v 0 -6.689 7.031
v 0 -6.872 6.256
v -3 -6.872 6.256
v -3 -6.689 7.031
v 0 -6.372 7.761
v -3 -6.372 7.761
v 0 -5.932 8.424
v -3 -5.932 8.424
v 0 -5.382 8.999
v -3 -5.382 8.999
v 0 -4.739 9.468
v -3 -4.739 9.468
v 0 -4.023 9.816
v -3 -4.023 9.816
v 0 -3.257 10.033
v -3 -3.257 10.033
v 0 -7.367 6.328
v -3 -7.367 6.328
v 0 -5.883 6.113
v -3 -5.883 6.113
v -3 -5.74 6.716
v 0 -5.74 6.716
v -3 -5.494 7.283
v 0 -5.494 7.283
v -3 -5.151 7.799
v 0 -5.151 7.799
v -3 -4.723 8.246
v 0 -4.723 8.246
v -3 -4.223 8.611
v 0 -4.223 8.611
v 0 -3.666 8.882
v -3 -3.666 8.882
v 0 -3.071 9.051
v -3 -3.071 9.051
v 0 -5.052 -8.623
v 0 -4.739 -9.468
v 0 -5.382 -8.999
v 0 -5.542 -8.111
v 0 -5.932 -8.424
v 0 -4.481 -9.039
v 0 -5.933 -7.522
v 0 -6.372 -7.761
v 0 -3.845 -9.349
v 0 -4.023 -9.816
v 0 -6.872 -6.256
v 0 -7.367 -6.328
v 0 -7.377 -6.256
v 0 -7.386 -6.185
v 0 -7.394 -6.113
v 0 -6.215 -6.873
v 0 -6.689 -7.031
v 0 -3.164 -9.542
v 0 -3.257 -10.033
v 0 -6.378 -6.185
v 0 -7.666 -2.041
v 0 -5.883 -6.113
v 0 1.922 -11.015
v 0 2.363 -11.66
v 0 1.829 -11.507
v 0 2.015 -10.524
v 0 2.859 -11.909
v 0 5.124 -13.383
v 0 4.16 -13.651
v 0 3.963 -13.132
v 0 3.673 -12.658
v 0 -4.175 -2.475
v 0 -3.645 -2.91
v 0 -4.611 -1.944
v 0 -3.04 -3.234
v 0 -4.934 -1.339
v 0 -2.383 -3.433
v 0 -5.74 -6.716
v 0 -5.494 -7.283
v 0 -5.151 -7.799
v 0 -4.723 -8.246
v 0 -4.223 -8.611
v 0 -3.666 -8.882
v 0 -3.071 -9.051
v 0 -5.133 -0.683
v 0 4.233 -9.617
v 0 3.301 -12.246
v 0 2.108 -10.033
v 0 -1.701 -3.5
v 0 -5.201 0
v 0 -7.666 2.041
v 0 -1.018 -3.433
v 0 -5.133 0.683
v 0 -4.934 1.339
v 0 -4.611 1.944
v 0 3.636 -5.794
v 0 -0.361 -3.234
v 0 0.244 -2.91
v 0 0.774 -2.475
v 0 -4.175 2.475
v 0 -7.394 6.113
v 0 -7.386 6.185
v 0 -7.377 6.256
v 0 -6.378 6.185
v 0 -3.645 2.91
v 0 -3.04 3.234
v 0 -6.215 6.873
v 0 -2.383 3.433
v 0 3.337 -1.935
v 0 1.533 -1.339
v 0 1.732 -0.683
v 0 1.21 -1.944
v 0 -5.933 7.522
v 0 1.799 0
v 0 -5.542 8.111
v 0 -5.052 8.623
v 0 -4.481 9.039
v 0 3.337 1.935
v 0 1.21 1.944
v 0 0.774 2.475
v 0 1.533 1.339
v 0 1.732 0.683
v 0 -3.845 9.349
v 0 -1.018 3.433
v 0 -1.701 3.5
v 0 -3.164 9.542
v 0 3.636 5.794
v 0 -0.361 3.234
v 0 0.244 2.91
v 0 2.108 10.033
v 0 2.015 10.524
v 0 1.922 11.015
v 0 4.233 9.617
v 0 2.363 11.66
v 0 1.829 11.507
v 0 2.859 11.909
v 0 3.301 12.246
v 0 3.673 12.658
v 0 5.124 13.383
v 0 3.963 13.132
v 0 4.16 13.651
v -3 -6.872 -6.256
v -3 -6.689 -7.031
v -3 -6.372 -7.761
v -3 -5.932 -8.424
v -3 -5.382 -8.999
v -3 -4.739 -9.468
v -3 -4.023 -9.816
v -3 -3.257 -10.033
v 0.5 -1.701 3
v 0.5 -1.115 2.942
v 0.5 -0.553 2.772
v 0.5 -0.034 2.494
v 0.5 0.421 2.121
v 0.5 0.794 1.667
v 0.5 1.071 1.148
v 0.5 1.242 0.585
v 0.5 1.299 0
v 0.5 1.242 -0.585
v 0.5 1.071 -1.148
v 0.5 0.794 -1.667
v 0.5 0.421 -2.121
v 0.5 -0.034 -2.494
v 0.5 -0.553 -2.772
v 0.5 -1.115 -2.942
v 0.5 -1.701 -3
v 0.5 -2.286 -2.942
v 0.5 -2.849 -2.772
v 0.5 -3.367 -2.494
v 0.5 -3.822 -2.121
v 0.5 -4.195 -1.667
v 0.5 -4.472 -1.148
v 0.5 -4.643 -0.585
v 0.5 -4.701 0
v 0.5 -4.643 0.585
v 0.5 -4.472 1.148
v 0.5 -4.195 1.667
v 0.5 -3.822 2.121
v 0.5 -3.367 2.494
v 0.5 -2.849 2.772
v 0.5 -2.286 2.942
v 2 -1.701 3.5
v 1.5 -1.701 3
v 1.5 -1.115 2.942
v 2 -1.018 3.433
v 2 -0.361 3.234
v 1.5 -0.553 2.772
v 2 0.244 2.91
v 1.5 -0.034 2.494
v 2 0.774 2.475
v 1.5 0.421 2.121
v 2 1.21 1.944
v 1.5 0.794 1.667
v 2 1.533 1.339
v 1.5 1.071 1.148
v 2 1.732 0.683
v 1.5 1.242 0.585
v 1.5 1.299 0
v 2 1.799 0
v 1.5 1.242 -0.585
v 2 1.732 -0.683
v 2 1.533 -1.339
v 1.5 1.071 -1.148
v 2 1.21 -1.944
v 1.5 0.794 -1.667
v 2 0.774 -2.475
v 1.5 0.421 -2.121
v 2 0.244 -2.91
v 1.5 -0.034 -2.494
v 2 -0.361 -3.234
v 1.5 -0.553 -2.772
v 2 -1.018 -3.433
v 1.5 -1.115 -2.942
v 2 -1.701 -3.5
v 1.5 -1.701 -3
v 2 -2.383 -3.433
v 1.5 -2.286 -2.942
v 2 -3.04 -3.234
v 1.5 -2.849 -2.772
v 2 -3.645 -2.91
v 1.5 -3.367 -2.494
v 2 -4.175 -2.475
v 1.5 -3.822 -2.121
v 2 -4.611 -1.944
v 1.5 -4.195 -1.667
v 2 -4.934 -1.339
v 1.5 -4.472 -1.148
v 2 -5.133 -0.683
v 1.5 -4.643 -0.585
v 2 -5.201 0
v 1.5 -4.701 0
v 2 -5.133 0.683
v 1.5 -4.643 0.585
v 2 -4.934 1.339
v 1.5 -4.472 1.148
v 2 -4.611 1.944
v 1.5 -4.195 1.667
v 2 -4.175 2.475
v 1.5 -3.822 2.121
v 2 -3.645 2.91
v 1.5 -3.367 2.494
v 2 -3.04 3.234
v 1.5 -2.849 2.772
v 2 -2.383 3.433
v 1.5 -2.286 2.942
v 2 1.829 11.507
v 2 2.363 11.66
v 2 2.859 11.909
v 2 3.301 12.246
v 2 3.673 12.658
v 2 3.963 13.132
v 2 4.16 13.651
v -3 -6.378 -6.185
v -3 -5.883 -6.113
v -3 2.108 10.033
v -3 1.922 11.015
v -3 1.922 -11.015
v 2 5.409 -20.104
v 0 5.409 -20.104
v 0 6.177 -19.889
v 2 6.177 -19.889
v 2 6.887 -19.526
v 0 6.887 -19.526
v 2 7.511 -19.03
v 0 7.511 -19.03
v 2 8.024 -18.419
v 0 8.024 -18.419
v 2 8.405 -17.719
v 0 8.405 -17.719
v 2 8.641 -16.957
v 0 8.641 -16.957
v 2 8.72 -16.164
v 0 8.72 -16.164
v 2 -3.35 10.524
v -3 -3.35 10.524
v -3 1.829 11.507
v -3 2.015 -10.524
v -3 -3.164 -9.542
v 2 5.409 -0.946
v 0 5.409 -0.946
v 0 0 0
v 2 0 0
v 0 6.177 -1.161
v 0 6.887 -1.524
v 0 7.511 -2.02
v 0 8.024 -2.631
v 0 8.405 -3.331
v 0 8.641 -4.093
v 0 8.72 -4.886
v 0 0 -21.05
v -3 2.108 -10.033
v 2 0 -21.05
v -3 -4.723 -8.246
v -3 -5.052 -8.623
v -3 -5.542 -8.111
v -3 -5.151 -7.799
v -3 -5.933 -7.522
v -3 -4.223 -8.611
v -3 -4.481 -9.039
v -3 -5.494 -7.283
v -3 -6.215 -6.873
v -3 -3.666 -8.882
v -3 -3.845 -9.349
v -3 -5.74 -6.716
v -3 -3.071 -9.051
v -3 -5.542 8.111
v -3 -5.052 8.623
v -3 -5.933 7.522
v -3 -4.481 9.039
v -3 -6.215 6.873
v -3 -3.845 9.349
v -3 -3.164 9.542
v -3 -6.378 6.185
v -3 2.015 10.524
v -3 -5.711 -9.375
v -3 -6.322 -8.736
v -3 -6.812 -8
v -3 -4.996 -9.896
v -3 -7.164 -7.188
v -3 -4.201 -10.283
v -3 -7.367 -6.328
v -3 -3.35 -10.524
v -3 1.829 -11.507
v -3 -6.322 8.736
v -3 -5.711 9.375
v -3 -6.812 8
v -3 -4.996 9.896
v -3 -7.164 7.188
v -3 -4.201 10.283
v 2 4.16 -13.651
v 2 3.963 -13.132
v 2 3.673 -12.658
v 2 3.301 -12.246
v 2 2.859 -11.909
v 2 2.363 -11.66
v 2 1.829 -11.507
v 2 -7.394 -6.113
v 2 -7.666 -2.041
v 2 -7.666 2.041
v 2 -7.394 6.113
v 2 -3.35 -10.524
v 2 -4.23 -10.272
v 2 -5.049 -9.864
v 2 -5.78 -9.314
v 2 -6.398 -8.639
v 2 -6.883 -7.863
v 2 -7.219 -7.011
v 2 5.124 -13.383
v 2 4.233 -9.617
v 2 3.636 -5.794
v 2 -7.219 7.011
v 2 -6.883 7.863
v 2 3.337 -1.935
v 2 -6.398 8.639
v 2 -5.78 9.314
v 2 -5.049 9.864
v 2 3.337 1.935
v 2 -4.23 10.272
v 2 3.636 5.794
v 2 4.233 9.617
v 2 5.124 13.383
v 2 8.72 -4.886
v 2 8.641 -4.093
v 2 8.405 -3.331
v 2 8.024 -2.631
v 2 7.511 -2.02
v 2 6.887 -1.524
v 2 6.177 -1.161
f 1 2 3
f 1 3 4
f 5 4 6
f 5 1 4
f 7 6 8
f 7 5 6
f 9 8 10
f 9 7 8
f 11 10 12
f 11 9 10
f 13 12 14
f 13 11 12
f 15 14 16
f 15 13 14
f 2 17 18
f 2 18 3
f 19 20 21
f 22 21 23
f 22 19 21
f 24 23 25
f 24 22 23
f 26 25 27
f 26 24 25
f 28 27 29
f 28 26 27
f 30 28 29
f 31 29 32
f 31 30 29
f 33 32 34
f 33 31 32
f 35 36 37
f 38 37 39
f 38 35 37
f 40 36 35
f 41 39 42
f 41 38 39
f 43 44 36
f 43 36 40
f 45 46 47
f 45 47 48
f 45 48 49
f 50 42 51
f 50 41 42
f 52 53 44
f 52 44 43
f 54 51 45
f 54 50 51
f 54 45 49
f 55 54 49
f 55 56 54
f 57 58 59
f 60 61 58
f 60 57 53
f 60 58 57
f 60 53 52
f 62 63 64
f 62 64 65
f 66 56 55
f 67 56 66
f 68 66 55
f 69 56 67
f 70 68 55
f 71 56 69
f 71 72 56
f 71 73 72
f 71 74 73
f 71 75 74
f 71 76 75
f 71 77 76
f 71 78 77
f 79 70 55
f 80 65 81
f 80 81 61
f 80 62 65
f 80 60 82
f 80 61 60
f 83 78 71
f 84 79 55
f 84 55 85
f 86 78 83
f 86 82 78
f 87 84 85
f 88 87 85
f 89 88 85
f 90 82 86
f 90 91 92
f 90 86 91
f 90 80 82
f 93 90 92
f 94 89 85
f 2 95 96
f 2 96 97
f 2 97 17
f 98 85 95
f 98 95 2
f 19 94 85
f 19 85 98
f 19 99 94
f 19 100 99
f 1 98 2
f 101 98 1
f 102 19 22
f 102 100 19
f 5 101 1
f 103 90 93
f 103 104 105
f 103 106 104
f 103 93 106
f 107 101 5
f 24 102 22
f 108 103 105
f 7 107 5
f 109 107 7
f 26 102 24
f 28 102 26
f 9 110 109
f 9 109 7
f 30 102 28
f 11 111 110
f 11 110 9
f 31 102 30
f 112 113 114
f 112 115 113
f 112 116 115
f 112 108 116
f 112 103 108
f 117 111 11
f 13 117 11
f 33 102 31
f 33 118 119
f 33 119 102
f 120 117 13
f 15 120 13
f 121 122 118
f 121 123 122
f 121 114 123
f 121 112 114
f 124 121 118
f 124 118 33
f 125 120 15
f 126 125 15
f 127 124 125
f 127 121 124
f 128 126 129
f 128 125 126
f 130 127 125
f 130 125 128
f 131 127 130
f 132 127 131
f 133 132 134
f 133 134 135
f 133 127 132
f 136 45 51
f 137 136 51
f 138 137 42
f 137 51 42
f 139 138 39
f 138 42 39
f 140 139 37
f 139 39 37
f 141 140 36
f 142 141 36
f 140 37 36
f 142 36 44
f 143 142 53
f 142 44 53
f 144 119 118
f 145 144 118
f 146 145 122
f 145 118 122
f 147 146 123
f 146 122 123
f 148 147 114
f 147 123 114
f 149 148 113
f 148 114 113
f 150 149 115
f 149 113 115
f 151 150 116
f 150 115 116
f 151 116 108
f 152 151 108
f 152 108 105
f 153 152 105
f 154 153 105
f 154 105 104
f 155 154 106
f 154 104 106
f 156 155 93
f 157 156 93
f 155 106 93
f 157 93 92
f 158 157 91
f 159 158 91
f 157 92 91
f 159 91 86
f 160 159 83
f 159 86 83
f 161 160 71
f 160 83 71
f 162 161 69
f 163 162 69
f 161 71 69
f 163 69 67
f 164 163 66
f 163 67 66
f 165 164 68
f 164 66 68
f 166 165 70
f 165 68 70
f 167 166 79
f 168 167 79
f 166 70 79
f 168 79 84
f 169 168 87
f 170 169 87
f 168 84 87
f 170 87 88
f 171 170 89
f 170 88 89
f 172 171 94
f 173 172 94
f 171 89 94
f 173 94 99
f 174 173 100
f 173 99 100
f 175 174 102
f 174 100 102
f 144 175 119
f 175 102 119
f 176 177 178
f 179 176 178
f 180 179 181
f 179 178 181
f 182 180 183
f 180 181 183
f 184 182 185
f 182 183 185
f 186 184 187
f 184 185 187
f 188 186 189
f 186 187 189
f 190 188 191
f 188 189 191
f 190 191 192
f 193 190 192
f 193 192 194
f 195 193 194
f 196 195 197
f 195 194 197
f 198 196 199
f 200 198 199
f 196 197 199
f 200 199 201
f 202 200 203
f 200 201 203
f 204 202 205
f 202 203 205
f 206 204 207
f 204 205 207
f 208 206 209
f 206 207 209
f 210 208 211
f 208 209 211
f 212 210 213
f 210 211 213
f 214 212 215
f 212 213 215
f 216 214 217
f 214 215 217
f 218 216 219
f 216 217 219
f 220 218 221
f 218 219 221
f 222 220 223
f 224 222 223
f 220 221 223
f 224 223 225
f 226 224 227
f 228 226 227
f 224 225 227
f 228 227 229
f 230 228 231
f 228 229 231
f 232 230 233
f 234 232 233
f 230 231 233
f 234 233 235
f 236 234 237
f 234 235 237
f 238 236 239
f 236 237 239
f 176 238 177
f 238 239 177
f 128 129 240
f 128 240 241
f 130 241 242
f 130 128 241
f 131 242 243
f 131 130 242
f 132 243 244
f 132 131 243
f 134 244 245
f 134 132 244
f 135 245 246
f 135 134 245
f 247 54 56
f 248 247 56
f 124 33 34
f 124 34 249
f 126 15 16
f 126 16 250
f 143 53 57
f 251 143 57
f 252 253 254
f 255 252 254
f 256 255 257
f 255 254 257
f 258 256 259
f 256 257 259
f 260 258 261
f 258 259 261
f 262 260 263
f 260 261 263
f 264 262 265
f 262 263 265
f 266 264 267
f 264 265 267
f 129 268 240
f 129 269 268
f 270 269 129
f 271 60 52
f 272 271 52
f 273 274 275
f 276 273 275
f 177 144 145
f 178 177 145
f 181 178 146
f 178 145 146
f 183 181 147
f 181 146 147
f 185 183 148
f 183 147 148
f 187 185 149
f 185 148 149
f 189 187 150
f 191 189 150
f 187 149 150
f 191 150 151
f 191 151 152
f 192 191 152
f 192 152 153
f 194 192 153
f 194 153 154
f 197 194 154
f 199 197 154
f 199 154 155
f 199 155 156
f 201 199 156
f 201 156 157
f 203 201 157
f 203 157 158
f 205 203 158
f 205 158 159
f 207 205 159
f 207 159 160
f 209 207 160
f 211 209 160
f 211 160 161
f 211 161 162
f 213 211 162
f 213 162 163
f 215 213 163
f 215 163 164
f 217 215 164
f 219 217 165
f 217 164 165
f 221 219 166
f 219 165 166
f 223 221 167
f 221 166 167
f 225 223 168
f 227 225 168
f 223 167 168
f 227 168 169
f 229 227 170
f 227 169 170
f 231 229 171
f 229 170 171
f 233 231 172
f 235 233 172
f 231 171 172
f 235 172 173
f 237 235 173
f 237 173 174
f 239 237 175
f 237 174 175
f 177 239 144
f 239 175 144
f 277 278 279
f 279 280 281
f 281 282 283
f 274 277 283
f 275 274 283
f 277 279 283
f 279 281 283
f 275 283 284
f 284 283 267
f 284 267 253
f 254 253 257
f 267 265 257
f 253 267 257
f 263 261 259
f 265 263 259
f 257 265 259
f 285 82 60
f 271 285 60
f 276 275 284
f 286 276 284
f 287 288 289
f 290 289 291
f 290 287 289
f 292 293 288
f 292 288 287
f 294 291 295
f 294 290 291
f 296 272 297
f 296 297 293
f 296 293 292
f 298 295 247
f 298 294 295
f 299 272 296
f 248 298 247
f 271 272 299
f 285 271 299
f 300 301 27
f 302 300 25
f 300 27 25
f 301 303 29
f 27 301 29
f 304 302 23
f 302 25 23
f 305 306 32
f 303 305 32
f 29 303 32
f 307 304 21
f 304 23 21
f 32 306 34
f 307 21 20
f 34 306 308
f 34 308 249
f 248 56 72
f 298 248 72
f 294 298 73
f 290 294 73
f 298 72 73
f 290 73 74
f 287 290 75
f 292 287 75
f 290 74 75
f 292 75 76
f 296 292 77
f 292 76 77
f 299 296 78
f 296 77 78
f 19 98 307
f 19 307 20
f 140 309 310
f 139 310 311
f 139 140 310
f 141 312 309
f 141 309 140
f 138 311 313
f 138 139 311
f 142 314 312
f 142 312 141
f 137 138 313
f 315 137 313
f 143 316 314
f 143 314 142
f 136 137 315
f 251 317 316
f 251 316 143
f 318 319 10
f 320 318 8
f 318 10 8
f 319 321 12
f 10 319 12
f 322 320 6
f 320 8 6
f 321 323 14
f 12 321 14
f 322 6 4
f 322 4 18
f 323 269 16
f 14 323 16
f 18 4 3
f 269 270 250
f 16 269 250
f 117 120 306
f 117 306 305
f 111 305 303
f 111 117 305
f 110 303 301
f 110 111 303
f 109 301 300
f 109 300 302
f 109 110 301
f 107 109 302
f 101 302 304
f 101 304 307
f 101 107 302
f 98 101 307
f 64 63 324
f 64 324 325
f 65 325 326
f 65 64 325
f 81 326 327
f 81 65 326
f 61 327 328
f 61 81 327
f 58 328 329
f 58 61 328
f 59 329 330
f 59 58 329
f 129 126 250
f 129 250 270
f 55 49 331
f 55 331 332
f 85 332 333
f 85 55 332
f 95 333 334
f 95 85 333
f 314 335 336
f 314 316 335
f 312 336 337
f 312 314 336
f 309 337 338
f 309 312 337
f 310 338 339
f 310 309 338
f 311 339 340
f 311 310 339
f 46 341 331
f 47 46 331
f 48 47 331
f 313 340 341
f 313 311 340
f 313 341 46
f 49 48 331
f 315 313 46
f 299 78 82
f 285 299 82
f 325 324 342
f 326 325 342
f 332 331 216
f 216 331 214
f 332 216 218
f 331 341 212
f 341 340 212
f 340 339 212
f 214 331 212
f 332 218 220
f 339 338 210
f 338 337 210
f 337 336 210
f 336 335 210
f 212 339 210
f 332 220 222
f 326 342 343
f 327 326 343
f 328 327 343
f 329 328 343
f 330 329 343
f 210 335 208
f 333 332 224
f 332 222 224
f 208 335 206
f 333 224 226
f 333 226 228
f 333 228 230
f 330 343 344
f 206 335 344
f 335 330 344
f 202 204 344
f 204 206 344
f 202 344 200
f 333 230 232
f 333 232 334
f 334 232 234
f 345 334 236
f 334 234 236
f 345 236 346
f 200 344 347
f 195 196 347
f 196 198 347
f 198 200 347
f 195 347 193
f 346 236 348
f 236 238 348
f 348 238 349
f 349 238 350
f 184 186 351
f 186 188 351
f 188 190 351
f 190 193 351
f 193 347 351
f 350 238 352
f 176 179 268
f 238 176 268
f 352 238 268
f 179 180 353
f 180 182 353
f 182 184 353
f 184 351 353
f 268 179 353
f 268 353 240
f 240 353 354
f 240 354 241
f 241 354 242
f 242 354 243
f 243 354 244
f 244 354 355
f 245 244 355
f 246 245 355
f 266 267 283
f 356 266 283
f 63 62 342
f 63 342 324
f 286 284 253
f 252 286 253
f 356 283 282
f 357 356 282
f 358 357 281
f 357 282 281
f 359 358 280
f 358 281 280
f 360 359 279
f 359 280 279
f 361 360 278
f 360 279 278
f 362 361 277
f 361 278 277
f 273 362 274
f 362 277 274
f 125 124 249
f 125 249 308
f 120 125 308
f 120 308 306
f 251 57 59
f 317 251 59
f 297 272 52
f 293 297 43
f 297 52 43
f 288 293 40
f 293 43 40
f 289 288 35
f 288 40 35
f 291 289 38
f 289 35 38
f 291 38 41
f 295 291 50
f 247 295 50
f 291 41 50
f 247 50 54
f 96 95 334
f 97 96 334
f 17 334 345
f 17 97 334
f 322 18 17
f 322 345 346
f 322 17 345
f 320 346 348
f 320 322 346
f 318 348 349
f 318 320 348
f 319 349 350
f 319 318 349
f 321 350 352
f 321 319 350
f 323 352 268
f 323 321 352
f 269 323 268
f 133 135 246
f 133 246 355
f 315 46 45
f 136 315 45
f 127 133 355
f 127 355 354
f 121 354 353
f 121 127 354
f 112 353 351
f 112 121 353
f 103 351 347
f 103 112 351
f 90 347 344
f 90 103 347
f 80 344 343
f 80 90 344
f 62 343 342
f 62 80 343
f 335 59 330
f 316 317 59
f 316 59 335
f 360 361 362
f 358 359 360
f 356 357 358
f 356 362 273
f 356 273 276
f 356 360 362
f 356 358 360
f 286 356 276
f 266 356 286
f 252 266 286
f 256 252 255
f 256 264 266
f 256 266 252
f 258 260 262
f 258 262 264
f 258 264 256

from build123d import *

# Parameters (mm, degrees)
EXTRUDE_1_DEPTH     = 2
EXTRUDE_2_DEPTH     = 2
EXTRUDE_5_DEPTH     = 5
SKETCH_7_R          = 3
CUT_EXTRUDE_1_DEPTH = 10
CHAMFER_3_SIZE      = 0.5


with BuildPart() as part:
    # Эскиз2 → Бобышка-Вытянуть1 (new body)
    with BuildSketch(Plane(origin=(0, 0, 0), x_dir=(0, 0, -1), z_dir=(1, 0, 0))):
        with BuildLine():
            Line((0, 0), (21.05, 0))
            Line((21.05, 0), (20.104030802, 5.409082892))
            ThreePointArc((20.104030802, 5.409082892), (18.737124717, 7.782379105), (16.163832232, 8.72))
            Line((16.163832232, 8.72), (4.886167768, 8.72))
            ThreePointArc((4.886167768, 8.72), (2.312875283, 7.782379105), (0.945969198, 5.409082892))
            Line((0.945969198, 5.409082892), (0, 0))
        make_face()
    extrude(amount=EXTRUDE_1_DEPTH)


with BuildPart() as body_2:
    # Эскиз3 → Бобышка-Вытянуть2 (new body)
    with BuildSketch(Plane(origin=(0, 0, 0), x_dir=(0, 0, -1), z_dir=(1, 0, 0))):
        with BuildLine():
            Line((11.506614891, 1.82874673), (10.524445921, -3.35031187))
            ThreePointArc((10.524445921, -3.35031187), (8.990381393, -6.104698232), (6.113073378, -7.393533672))
            ThreePointArc((6.113073378, -7.393533672), (0, -7.700615354), (-6.113073378, -7.393533672))
            ThreePointArc((-6.113073378, -7.393533672), (-8.990381393, -6.104698232), (-10.524445921, -3.35031187))
            Line((-10.524445921, -3.35031187), (-11.506614891, 1.82874673))
            ThreePointArc((-11.506614891, 1.82874673), (-12.24601398, 3.30065353), (-13.651076849, 4.160315659))
            Line((-13.651076849, 4.160315659), (-13.383408675, 5.123826815))
            ThreePointArc((-13.383408675, 5.123826815), (0, 3.299384646), (13.383408675, 5.123826815))
            Line((13.383408675, 5.123826815), (13.651076849, 4.160315659))
            ThreePointArc((13.651076849, 4.160315659), (12.24601398, 3.30065353), (11.506614891, 1.82874673))
        make_face()
    extrude(amount=EXTRUDE_2_DEPTH)

    # Эскиз4 → Бобышка-Вытянуть5 (add)
    with BuildSketch(Plane(origin=(2, 0, 0), x_dir=(0, 0, -1), z_dir=(1, 0, 0))):
        with BuildLine():
            Line((-10.033201508, -3.257151114), (-11.015370478, 1.921907487))
            Line((-11.015370478, 1.921907487), (-11.506614891, 1.82874673))
            Line((-11.506614891, 1.82874673), (-10.524445921, -3.35031187))
            ThreePointArc((-10.524445921, -3.35031187), (-9.069338414, -6.030742987), (-6.327818345, -7.367199695))
            Line((-6.327818345, -7.367199695), (-6.256236689, -6.872350156))
            ThreePointArc((-6.256236689, -6.872350156), (-8.723604752, -5.669539118), (-10.033201508, -3.257151114))
        make_face()
        with BuildLine():
            Line((-10.524126065, 2.015068244), (-9.541957094, -3.163990357))
            ThreePointArc((-9.541957094, -3.163990357), (-8.377871089, -5.30833525), (-6.184655034, -6.377500616))
            Line((-6.184655034, -6.377500616), (-6.113073378, -5.882651077))
            ThreePointArc((-6.113073378, -5.882651077), (-8.032137427, -4.947131381), (-9.050712681, -3.0708296))
            Line((-9.050712681, -3.0708296), (-10.032881652, 2.108229001))
            Line((-10.032881652, 2.108229001), (-10.524126065, 2.015068244))
        make_face()
    extrude_5 = extrude(amount=-EXTRUDE_5_DEPTH)

    # Зеркальное отражение1: Бобышка-Вытянуть5 across plane
    add(extrude_5.mirror(Plane.XY))

    # Эскиз7 → Вырез-Вытянуть1 (cut)
    with BuildSketch(Plane.ZY):
        with Locations((0, -1.700615354)):
            Circle(SKETCH_7_R)
    extrude(amount=-CUT_EXTRUDE_1_DEPTH, mode=Mode.SUBTRACT)

    # Фаска3
    chamfer_3_edges = [body_2.edges().sort_by_distance(p)[0] for p in [
        (2, -1.700615354, -3),
        (0, -1.700615354, -3),
    ]]
    chamfer(chamfer_3_edges, length=CHAMFER_3_SIZE)


solid = Compound([part.part, body_2.part])
